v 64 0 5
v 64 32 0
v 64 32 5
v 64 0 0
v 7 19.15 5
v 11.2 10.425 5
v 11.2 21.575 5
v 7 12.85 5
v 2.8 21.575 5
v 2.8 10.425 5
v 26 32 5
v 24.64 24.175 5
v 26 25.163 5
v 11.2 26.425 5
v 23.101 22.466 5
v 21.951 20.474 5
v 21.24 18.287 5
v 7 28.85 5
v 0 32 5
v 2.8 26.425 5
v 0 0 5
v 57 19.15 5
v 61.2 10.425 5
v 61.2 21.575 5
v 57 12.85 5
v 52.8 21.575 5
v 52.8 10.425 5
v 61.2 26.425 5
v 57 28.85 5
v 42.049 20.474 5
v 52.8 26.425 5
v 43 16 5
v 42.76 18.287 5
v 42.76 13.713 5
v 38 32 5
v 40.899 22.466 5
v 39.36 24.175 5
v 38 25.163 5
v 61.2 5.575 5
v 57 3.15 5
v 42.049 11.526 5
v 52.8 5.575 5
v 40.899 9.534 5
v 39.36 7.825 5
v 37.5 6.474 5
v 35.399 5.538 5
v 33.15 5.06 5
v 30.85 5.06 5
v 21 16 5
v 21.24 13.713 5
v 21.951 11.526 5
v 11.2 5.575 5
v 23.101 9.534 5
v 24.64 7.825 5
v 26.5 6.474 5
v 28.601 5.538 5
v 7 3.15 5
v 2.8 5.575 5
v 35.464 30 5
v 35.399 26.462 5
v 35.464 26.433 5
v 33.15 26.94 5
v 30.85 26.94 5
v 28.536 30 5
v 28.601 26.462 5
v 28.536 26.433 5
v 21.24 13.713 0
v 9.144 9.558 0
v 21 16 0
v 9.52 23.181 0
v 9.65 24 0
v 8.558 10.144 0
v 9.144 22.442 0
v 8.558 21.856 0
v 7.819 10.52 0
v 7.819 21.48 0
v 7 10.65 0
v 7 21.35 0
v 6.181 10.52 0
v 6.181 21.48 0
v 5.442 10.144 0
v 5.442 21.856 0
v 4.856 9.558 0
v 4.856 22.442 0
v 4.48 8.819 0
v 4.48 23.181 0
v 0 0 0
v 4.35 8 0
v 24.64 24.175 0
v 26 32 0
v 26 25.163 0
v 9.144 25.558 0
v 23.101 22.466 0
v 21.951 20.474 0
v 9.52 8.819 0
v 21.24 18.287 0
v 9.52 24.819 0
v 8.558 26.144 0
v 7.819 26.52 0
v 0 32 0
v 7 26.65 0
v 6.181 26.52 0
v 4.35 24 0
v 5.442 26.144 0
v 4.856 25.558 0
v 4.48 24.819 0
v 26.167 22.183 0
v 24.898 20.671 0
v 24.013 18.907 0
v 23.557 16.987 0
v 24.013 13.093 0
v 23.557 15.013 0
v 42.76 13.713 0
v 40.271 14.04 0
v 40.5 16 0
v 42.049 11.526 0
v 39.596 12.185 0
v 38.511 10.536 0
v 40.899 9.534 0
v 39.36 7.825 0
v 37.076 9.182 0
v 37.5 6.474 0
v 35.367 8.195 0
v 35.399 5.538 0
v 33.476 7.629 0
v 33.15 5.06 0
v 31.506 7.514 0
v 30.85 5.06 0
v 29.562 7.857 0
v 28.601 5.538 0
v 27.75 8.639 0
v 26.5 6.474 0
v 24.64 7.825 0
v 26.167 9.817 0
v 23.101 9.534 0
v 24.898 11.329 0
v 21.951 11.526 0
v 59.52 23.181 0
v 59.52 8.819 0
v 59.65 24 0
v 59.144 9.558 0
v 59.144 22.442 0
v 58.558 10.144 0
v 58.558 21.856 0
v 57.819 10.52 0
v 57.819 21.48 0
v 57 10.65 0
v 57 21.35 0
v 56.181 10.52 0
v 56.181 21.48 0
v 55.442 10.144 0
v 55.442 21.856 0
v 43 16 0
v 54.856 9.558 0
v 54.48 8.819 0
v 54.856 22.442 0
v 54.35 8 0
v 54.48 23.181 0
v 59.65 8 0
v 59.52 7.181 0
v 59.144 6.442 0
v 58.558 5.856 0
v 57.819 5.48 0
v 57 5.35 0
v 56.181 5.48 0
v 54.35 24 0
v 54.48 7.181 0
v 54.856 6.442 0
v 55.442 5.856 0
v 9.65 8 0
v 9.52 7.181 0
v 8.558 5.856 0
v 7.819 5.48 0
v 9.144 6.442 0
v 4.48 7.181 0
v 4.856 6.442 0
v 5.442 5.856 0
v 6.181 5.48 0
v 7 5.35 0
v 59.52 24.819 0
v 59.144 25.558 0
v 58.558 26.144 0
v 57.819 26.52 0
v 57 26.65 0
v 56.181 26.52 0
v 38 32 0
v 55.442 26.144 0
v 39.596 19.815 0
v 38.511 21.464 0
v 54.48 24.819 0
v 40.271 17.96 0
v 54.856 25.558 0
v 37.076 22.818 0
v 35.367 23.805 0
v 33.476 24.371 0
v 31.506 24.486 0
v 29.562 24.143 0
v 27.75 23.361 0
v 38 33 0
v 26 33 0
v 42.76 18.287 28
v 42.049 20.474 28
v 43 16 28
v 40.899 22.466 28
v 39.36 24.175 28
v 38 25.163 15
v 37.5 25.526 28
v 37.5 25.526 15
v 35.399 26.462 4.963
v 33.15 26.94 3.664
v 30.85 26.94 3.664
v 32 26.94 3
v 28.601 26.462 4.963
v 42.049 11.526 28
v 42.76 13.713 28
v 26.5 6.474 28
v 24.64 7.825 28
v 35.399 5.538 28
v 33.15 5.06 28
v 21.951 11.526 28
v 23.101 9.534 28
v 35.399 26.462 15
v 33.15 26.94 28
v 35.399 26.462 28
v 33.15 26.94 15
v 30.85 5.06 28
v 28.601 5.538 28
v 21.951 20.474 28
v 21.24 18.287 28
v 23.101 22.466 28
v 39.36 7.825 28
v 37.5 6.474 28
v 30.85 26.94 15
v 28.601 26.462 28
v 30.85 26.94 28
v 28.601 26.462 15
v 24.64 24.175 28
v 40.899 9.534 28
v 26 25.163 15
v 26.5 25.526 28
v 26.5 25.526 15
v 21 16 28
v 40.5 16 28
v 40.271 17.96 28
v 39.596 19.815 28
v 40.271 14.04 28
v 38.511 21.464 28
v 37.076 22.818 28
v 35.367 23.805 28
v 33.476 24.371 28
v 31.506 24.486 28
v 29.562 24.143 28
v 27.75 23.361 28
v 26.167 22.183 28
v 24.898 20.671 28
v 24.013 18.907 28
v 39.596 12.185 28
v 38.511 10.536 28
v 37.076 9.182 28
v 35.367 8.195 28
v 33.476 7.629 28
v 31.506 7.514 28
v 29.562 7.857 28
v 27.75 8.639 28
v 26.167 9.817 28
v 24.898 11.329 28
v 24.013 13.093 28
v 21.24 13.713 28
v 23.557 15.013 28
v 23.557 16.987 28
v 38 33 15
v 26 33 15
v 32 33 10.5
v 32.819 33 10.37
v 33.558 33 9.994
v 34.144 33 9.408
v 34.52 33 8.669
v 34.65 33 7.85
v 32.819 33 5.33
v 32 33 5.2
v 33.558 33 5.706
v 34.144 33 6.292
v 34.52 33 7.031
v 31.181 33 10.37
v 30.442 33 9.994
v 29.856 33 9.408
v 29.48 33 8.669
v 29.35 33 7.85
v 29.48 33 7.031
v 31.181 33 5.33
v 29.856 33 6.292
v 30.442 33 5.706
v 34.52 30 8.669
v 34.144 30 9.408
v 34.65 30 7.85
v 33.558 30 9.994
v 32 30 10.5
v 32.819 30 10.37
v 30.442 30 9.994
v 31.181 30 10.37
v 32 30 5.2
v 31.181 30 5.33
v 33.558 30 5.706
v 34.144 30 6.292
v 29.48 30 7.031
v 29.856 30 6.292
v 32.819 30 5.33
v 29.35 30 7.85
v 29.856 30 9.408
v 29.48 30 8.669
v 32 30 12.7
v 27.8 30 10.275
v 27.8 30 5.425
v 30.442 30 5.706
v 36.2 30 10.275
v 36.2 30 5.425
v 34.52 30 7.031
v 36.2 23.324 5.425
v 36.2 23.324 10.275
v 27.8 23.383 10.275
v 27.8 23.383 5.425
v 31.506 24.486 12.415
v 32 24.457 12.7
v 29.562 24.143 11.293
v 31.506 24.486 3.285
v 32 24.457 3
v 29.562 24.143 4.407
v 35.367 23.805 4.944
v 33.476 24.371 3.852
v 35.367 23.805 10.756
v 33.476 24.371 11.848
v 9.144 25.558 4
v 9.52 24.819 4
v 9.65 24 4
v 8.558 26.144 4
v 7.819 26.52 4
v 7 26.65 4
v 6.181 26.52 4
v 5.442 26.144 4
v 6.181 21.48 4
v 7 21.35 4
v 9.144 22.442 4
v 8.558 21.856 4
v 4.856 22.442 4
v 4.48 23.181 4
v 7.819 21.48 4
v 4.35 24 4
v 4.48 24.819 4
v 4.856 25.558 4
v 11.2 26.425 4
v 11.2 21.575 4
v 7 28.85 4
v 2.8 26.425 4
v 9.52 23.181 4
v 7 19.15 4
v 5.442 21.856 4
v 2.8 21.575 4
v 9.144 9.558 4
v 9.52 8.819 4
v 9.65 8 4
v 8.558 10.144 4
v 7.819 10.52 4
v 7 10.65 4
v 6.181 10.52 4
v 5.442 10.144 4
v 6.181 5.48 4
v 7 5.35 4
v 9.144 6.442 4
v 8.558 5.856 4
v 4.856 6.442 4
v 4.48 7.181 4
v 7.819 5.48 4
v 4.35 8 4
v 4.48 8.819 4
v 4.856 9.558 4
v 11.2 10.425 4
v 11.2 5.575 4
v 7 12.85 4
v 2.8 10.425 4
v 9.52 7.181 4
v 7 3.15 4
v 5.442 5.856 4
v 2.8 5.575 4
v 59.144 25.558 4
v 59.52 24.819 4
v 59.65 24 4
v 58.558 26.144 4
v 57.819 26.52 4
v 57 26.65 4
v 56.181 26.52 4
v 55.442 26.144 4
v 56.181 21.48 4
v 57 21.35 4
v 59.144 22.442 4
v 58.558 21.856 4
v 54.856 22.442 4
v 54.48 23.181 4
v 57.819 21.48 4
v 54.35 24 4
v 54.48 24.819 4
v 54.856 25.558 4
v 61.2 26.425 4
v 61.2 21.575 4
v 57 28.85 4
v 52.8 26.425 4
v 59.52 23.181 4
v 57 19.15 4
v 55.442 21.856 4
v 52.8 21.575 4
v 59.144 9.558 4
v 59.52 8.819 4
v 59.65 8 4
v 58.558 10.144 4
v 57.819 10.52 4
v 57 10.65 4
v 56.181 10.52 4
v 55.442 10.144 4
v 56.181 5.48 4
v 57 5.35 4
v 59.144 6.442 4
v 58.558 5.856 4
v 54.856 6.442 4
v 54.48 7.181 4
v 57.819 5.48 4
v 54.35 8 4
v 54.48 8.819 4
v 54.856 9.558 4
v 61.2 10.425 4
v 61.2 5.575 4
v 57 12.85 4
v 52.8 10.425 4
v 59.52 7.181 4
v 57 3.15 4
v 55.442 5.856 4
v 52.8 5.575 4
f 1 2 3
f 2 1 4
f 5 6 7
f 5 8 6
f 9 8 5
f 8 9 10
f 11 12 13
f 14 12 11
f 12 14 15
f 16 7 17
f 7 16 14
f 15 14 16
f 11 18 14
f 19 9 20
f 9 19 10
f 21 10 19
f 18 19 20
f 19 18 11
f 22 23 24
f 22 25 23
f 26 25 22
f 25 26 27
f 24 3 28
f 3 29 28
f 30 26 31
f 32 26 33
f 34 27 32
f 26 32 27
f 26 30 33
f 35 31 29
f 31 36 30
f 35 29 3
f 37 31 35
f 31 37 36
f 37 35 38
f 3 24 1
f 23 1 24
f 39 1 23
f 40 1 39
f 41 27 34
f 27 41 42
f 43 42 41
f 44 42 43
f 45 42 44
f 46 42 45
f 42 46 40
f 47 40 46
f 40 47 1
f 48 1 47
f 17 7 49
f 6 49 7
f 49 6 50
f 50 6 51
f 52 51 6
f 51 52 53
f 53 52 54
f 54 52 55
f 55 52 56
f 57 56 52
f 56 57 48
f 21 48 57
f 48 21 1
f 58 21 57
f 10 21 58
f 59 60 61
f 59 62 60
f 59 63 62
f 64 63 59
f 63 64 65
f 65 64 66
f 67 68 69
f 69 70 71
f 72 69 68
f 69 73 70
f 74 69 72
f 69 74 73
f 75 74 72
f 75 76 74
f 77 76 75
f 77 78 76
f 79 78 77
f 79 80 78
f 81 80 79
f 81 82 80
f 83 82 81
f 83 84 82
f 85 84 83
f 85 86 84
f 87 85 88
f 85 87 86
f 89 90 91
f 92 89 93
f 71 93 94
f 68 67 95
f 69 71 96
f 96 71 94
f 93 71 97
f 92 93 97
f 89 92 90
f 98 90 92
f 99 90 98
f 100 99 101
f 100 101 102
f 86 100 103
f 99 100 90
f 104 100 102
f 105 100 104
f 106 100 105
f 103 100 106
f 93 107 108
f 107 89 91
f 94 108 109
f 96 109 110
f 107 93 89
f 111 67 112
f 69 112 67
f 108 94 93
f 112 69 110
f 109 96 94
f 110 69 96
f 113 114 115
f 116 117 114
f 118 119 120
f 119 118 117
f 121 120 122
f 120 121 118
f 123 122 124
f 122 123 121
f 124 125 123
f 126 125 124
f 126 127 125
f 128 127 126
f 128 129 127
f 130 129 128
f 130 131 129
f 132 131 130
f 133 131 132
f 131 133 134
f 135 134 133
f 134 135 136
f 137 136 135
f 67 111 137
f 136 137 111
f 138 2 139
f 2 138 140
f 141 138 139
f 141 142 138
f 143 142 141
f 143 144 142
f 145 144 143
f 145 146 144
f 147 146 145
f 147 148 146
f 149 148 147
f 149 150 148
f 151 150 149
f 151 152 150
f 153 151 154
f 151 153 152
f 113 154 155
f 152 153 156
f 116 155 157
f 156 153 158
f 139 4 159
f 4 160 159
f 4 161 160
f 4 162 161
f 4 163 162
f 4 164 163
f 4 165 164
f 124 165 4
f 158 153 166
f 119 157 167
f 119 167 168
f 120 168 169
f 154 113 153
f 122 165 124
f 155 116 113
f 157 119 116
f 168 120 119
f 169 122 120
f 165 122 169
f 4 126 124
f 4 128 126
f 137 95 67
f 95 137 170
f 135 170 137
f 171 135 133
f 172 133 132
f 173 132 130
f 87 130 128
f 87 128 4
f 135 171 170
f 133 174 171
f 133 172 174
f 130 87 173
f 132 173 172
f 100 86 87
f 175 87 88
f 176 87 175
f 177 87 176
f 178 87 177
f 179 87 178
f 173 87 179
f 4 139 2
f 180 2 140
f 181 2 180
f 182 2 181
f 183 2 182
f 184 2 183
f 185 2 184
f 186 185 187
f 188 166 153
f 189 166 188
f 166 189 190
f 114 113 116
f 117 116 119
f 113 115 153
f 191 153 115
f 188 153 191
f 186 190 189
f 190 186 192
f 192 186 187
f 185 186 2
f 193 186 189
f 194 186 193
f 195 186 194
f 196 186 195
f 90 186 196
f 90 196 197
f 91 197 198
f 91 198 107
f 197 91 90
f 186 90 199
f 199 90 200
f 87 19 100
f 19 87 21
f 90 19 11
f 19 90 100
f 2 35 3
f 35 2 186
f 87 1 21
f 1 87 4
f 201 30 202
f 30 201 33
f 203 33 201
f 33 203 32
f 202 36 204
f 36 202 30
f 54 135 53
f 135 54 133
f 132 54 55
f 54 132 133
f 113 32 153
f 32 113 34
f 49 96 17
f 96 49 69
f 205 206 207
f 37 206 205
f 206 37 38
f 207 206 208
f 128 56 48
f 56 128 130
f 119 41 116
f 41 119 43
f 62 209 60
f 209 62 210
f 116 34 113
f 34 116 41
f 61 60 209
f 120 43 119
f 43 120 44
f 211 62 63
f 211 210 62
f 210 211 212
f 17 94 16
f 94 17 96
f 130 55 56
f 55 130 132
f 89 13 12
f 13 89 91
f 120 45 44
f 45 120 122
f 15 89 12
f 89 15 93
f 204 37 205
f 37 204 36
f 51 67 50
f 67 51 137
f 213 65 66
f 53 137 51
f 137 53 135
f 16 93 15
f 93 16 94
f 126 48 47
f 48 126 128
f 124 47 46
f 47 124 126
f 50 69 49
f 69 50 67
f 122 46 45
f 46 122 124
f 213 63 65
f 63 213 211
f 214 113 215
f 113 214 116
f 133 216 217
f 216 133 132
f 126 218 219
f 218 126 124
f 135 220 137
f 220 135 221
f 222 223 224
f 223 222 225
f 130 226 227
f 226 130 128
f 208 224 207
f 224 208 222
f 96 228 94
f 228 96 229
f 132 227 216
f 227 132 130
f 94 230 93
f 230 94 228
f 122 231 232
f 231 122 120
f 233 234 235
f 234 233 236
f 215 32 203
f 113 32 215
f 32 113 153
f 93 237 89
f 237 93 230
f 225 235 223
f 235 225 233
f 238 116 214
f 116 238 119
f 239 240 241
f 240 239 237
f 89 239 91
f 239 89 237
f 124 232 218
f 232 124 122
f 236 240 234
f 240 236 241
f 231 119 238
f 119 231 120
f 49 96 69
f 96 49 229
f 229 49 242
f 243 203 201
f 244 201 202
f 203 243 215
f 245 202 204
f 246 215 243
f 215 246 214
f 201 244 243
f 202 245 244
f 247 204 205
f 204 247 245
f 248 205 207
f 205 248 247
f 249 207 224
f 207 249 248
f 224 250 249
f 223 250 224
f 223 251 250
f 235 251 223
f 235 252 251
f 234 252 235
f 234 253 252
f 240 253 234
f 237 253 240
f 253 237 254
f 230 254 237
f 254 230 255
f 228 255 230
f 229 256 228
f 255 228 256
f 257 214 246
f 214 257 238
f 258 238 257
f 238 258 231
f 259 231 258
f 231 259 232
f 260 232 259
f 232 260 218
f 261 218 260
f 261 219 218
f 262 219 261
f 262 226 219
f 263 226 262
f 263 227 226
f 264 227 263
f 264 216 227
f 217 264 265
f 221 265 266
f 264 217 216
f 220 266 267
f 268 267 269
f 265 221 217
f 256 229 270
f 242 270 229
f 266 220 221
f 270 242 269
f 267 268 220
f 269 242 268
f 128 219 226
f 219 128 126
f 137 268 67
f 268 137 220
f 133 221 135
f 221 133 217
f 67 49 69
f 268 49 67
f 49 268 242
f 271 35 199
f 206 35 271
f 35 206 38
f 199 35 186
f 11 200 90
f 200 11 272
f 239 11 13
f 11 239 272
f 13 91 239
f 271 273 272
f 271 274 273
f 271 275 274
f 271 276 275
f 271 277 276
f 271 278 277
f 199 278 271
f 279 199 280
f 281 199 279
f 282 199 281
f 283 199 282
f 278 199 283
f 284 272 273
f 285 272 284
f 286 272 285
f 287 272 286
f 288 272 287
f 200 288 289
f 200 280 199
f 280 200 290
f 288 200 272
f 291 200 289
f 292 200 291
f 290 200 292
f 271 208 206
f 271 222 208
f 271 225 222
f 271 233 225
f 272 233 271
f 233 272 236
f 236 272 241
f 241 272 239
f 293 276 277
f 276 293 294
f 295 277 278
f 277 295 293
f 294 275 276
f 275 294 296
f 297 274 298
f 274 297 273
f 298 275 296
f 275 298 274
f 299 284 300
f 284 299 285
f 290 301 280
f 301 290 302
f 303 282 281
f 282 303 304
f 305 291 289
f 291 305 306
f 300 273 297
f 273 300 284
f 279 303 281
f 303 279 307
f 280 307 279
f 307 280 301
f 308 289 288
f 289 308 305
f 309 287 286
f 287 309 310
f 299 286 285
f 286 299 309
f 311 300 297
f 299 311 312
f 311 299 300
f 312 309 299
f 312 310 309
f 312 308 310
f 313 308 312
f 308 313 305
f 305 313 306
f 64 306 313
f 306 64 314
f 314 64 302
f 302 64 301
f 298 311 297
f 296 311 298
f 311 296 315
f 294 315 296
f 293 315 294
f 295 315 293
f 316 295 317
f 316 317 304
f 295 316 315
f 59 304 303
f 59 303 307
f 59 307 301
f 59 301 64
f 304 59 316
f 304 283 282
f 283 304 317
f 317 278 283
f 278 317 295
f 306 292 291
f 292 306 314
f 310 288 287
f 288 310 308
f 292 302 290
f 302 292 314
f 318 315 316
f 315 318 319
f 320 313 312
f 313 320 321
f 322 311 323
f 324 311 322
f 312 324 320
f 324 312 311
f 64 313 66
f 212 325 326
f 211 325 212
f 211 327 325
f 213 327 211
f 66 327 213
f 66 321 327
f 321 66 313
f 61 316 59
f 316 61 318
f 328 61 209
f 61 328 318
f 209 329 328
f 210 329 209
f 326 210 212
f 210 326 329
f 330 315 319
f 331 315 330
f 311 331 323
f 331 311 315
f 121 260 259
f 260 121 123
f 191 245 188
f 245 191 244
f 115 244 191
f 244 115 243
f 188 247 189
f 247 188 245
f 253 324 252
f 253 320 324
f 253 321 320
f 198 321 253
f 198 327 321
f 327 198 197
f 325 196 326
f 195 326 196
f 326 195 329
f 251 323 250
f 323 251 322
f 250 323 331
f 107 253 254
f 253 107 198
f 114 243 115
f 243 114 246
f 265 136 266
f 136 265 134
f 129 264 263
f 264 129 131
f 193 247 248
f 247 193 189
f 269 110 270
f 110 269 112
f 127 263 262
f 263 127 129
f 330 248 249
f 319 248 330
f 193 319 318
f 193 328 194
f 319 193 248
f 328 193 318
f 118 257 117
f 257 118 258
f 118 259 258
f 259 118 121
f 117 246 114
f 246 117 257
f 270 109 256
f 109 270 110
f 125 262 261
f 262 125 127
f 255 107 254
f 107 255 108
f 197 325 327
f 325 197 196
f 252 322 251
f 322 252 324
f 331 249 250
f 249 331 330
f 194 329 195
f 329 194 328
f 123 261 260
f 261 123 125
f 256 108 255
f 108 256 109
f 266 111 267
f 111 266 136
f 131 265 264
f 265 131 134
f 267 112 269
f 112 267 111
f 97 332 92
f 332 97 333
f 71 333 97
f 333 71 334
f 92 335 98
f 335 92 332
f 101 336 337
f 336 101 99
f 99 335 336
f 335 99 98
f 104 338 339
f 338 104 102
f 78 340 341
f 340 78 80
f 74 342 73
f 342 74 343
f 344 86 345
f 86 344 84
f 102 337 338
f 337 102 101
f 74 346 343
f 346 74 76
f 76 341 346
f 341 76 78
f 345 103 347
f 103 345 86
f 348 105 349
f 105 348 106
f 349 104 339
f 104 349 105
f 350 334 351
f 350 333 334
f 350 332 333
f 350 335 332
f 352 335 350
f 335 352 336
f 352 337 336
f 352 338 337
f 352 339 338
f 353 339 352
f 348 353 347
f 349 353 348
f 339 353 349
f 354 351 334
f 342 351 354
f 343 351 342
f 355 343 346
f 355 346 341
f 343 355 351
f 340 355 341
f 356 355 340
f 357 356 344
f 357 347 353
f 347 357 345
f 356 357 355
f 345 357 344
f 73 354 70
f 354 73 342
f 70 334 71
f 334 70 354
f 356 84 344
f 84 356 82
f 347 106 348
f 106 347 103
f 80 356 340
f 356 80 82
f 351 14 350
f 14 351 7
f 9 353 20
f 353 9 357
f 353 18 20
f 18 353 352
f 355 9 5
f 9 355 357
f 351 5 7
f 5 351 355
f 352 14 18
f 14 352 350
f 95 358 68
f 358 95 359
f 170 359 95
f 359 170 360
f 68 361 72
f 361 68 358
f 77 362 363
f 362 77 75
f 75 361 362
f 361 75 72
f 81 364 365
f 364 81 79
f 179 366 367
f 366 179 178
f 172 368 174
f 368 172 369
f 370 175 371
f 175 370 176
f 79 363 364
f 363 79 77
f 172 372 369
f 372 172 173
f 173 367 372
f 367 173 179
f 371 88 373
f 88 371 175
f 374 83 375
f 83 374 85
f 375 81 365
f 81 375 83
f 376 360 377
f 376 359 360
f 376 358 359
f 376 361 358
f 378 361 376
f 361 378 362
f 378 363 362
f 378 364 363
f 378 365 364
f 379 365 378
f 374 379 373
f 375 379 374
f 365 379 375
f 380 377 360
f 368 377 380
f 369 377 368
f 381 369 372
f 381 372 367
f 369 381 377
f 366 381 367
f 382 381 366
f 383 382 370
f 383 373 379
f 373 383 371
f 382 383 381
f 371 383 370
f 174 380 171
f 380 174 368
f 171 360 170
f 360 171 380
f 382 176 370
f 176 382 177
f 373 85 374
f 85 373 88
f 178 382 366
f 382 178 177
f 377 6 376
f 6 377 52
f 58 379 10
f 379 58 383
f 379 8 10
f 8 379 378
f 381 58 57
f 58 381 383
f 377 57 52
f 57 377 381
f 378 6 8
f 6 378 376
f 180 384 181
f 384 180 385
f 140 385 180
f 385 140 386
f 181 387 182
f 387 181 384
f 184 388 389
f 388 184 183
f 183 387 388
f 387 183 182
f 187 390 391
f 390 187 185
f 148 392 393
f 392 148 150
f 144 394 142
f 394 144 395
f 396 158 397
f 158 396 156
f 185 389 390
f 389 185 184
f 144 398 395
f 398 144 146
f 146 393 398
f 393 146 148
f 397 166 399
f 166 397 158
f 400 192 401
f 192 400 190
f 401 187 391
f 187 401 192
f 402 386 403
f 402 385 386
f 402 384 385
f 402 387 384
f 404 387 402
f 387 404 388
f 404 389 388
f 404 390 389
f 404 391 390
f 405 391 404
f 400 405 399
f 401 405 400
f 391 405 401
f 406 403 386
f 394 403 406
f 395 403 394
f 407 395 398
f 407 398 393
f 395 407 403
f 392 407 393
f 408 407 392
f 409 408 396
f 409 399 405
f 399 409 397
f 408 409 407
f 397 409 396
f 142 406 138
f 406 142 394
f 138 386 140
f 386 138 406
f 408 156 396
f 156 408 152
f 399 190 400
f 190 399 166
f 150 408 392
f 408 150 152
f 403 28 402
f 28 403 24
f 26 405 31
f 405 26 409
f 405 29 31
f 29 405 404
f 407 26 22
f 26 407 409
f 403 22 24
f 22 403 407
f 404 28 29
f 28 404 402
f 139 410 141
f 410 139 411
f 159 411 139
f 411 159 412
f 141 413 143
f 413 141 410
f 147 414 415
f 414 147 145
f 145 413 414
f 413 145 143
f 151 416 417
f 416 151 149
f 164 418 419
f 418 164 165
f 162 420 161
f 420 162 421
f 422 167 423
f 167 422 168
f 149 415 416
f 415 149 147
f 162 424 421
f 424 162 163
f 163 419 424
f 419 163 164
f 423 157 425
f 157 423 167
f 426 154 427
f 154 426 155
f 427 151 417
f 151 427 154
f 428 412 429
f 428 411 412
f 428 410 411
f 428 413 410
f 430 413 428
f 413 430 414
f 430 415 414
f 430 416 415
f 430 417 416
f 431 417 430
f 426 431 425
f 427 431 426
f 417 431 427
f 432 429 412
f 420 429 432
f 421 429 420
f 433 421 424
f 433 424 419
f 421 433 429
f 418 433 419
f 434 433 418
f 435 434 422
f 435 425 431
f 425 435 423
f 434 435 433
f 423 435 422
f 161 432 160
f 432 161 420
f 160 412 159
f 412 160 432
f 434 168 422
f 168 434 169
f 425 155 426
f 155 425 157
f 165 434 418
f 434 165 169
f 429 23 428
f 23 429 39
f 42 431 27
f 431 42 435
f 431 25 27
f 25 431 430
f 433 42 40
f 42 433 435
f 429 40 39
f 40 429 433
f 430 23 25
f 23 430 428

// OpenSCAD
// file: common.scad
//GLOBAL VALUES


ear_outer=32; // Outer diameter of each ear
ear_inner=5; // hole for each ear M5

mounting_gap = 6.9; // gap between two ears to mount the light



ear_thick=8;

stacked_len = ear_thick*3;
screw_mount_space = 20;
screw_mount_offset =7;
total_len = stacked_len + screw_mount_space*2;
mounting_diff = 8;

//M3 fastener values

m3_nut_trap_d = 6.7;
m3_nut_thick= 2.4;

m3_bolt_head_d = 5.6;
m3_bolt_thick = 3;

//M5 fastener values

m5_nut_thick = 4;
m5_locknut_thick = 5;
nut_trap_d = 9.7;
bolt_head_d = 8.6;



module bolt_nut(hole_len, bolt_d, flip=false){
    /*
        Create a model for a hole with bolt end on one end and nut hole on the other end.
    Note, this functions doesn't subtract the model it only makes the model
    */
    // currently only implemented for 3mm
    if (flip){
        hole_w_end(hole_len, m3_nut_thick, "hex", bolt_d);
        translate([0,0, hole_len]){
            rotate([180, 0, 0]){
                hole_w_end(hole_len, m3_bolt_thick, "round", bolt_d);
            }
        }
    } else {
        hole_w_end(hole_len, m3_bolt_thick, "round", bolt_d);
        translate([0,0, hole_len]){
            rotate([180, 0, 0]){
                hole_w_end(hole_len, m3_nut_thick, "hex", bolt_d);
            }
        }
    }
}

// More generic functions replacing m5_ hole-making functions
module hole_w_end(hole_len, trap_height, type, bolt_d, flip=false){
    /*
       bolt_d - bolt diameter, i.e. 3, 5 mm
        type -- type of the head hole: 'none', 'hex', 'round
    */
    if (type != "none"){
        cylinder(h=hole_len-trap_height, d=bolt_d, $fn=20);
        if (flip){
            m_recess(trap_height, type, bolt_d);
            translate([0,0,trap_height])
                cylinder(h=hole_len-trap_height, d=bolt_d, $fn=20);

        } else {
                translate([0,0, hole_len - trap_height])
                    m_recess(trap_height, type, bolt_d);
        }
    } else {
        cylinder(h=hole_len, d=bolt_d);
    }
}

module m_recess(height, end_type, bolt_d) {
    // nut/bolt capture hole
    /*
       bolt_d - bolt diameter, i.e. 3, 5 mm
        type -- type of the head hole: 'none', 'hex', 'round
    */
    if (bolt_d >= 3 && bolt_d <= 4){
        //M3
        make_recess(height, end_type, m3_nut_trap_d);
    } else if (bolt_d >= 5 && bolt_d <= 6){
        // M5
        make_recess(height, end_type, nut_trap_d);
    }

}

module make_recess(height, end_type, trap_d){
    rotate([0, 0,90]){
        if (end_type == "hex"){
            cylinder(h=height, d=trap_d, $fn=6);
        } else if (end_type == "round"){
            cylinder(h=height, d=trap_d, $fn=20);
        }
    }
}


//Functions specific to M5 size,
// TODO rewrite as hole_w_end m_recess
module m5_recess(height, end_type) {
    // nut/bolt capture hole
    rotate([0, 0,90]){
        if (end_type == "hex"){
            cylinder(h=height, d=nut_trap_d, $fn=6);
        } else if (end_type == "round"){
            cylinder(h=height, d=nut_trap_d, $fn=20);
        }
    }
}



module m5_hole_w_end(hole_len, trap_height, type){
    //Given hole lenght and trap height create a nut trap hole
    if (type != "none"){
        cylinder(h=hole_len-trap_height, d=5.3, $fn=20); // M5 hole;
            translate([0,0, hole_len-trap_height])
                m5_recess(trap_height, type);
    } else {
        cylinder(h=hole_len, d=5.3); // M5 hole;
    }
}
module m5_hole_w_ends(hole_len, nut_extra=0){
    m5_hole_w_end(hole_len, m5_nut_thick, "round");
    rotate([0, 180, 0])
        translate([0, 0, - hole_len])
            m5_hole_w_end(hole_len, m5_nut_thick + nut_extra, "hex");

}
module set_mounting_hole(x_offset, y_offset, thickness, nut_height, end_type, flip=false){
    /*
    end_type -- end types: - hex, round, none
    */
    translate([x_offset, y_offset, 0]){
        hole_w_end(thickness, nut_height, end_type, 5.3, flip);
    }
}



module mounting_holes_2(fastener_len, nut_height, end_type){
    width_offsetn = 16;
    set_mounting_hole(
        screw_mount_offset,
        width_offset + mounting_diff,
        fastener_len,
        nut_height,
        end_type);

    set_mounting_hole(
        total_len - screw_mount_offset,
        width_offset + mounting_diff,
        fastener_len,
        nut_height,
        end_type);


 }

module mounting_holes(fastener_len, nut_height, end_type, flip=false){
    width_offset = 16;
    // Side towards the beginning
    set_mounting_hole(
        screw_mount_offset,
        width_offset + mounting_diff,
        fastener_len,
        nut_height,
        end_type,
        flip);

    set_mounting_hole(
        screw_mount_offset,
        width_offset - mounting_diff,
        fastener_len,
        nut_height,
        end_type,
        flip);

    // Side towards the end
    set_mounting_hole(
        total_len - screw_mount_offset,
        width_offset + mounting_diff,
        fastener_len,
        nut_height,
        end_type,
        flip);

    set_mounting_hole(
        total_len - screw_mount_offset,
        width_offset - mounting_diff,
        fastener_len,
        nut_height,
        end_type,
        flip);
}
// main file
include <common.scad>

// mount for the side of the stand

// Vertical dimensions
stand_mount_h=28;
top_segment=5;
mid_cutout=10;
bottom_segment=13;

// distance under the thread of the stand
under_thread_dist = 4;

//horizontal dimensions
cutout_width = 12;
inner_width = 17;
outer_width = 22;

module stand_hole(h, outer_d, inner_d, attach_offset){
    difference(){
        cyl_w_m5_side_attach(h, outer_d, attach_offset);
        cylinder(h=h, d=inner_d);
        
    }
}

module stand_base(base_thick, outer_d){
        difference(){
            cube([total_len, ear_outer, base_thick]);
            translate([total_len/2, ear_outer/2, 0])
                cylinder(h=base_thick, d=outer_d);
        }
}

module cyl_w_base(base_thick, outer_d, inner_d, cyl_h, attach_offset){
    //Create base and cylinder mount
    // base_thick -- base thickness
    // outer_d -- outer diameter shell
    // inner_d -- inner diameter of a light mount
    // attach_offset - z offset
    stand_base(base_thick, outer_d);
    translate([total_len/2, ear_outer/2, 0])
        stand_hole(cyl_h, outer_d, inner_d, attach_offset);
    
    }

module cyl_w_m5_side_attach(cyl_h, outer_d, attach_offset){
    // Given mounting height, outer diameter of the sylinder and z-height attach offset
    // Build an attachement to fastening cylinder to the stand using m5 bolt and semi-captured nut
    flat_w = 12;
    extra_thick= 8;
    difference(){
        union() {
            cylinder(h=cyl_h, d=outer_d);
            if (attach_offset > 0){
                translate([-flat_w/2, inner_width/2, 0])
                        cube([flat_w, inner_width/2, attach_offset]);
            }
            translate([-flat_w/2, inner_width, attach_offset]){
                rotate([90, 0, 0])
                        cube([flat_w, flat_w, m5_nut_thick+extra_thick]);
                        
            }
        }
        translate([0, flat_w+extra_thick-1, nut_trap_d/2 + attach_offset])
            rotate([90, 0, 0])
                // nut needs extra room inside the cylinder (m5_nut_thick+3)
                m5_hole_w_end(m5_nut_thick+extra_thick, m5_nut_thick+3, "hex");
    }
}

//side_m5_attach();


base_thick = 5;
difference(){
    cyl_w_base(base_thick, outer_width, inner_width, stand_mount_h, top_segment-m5_nut_thick/2);
    mounting_holes(base_thick, m5_nut_thick-3, "hex");
}

//stand_hole(stand_mount_h, outer_width, inner_width, top_segment);
